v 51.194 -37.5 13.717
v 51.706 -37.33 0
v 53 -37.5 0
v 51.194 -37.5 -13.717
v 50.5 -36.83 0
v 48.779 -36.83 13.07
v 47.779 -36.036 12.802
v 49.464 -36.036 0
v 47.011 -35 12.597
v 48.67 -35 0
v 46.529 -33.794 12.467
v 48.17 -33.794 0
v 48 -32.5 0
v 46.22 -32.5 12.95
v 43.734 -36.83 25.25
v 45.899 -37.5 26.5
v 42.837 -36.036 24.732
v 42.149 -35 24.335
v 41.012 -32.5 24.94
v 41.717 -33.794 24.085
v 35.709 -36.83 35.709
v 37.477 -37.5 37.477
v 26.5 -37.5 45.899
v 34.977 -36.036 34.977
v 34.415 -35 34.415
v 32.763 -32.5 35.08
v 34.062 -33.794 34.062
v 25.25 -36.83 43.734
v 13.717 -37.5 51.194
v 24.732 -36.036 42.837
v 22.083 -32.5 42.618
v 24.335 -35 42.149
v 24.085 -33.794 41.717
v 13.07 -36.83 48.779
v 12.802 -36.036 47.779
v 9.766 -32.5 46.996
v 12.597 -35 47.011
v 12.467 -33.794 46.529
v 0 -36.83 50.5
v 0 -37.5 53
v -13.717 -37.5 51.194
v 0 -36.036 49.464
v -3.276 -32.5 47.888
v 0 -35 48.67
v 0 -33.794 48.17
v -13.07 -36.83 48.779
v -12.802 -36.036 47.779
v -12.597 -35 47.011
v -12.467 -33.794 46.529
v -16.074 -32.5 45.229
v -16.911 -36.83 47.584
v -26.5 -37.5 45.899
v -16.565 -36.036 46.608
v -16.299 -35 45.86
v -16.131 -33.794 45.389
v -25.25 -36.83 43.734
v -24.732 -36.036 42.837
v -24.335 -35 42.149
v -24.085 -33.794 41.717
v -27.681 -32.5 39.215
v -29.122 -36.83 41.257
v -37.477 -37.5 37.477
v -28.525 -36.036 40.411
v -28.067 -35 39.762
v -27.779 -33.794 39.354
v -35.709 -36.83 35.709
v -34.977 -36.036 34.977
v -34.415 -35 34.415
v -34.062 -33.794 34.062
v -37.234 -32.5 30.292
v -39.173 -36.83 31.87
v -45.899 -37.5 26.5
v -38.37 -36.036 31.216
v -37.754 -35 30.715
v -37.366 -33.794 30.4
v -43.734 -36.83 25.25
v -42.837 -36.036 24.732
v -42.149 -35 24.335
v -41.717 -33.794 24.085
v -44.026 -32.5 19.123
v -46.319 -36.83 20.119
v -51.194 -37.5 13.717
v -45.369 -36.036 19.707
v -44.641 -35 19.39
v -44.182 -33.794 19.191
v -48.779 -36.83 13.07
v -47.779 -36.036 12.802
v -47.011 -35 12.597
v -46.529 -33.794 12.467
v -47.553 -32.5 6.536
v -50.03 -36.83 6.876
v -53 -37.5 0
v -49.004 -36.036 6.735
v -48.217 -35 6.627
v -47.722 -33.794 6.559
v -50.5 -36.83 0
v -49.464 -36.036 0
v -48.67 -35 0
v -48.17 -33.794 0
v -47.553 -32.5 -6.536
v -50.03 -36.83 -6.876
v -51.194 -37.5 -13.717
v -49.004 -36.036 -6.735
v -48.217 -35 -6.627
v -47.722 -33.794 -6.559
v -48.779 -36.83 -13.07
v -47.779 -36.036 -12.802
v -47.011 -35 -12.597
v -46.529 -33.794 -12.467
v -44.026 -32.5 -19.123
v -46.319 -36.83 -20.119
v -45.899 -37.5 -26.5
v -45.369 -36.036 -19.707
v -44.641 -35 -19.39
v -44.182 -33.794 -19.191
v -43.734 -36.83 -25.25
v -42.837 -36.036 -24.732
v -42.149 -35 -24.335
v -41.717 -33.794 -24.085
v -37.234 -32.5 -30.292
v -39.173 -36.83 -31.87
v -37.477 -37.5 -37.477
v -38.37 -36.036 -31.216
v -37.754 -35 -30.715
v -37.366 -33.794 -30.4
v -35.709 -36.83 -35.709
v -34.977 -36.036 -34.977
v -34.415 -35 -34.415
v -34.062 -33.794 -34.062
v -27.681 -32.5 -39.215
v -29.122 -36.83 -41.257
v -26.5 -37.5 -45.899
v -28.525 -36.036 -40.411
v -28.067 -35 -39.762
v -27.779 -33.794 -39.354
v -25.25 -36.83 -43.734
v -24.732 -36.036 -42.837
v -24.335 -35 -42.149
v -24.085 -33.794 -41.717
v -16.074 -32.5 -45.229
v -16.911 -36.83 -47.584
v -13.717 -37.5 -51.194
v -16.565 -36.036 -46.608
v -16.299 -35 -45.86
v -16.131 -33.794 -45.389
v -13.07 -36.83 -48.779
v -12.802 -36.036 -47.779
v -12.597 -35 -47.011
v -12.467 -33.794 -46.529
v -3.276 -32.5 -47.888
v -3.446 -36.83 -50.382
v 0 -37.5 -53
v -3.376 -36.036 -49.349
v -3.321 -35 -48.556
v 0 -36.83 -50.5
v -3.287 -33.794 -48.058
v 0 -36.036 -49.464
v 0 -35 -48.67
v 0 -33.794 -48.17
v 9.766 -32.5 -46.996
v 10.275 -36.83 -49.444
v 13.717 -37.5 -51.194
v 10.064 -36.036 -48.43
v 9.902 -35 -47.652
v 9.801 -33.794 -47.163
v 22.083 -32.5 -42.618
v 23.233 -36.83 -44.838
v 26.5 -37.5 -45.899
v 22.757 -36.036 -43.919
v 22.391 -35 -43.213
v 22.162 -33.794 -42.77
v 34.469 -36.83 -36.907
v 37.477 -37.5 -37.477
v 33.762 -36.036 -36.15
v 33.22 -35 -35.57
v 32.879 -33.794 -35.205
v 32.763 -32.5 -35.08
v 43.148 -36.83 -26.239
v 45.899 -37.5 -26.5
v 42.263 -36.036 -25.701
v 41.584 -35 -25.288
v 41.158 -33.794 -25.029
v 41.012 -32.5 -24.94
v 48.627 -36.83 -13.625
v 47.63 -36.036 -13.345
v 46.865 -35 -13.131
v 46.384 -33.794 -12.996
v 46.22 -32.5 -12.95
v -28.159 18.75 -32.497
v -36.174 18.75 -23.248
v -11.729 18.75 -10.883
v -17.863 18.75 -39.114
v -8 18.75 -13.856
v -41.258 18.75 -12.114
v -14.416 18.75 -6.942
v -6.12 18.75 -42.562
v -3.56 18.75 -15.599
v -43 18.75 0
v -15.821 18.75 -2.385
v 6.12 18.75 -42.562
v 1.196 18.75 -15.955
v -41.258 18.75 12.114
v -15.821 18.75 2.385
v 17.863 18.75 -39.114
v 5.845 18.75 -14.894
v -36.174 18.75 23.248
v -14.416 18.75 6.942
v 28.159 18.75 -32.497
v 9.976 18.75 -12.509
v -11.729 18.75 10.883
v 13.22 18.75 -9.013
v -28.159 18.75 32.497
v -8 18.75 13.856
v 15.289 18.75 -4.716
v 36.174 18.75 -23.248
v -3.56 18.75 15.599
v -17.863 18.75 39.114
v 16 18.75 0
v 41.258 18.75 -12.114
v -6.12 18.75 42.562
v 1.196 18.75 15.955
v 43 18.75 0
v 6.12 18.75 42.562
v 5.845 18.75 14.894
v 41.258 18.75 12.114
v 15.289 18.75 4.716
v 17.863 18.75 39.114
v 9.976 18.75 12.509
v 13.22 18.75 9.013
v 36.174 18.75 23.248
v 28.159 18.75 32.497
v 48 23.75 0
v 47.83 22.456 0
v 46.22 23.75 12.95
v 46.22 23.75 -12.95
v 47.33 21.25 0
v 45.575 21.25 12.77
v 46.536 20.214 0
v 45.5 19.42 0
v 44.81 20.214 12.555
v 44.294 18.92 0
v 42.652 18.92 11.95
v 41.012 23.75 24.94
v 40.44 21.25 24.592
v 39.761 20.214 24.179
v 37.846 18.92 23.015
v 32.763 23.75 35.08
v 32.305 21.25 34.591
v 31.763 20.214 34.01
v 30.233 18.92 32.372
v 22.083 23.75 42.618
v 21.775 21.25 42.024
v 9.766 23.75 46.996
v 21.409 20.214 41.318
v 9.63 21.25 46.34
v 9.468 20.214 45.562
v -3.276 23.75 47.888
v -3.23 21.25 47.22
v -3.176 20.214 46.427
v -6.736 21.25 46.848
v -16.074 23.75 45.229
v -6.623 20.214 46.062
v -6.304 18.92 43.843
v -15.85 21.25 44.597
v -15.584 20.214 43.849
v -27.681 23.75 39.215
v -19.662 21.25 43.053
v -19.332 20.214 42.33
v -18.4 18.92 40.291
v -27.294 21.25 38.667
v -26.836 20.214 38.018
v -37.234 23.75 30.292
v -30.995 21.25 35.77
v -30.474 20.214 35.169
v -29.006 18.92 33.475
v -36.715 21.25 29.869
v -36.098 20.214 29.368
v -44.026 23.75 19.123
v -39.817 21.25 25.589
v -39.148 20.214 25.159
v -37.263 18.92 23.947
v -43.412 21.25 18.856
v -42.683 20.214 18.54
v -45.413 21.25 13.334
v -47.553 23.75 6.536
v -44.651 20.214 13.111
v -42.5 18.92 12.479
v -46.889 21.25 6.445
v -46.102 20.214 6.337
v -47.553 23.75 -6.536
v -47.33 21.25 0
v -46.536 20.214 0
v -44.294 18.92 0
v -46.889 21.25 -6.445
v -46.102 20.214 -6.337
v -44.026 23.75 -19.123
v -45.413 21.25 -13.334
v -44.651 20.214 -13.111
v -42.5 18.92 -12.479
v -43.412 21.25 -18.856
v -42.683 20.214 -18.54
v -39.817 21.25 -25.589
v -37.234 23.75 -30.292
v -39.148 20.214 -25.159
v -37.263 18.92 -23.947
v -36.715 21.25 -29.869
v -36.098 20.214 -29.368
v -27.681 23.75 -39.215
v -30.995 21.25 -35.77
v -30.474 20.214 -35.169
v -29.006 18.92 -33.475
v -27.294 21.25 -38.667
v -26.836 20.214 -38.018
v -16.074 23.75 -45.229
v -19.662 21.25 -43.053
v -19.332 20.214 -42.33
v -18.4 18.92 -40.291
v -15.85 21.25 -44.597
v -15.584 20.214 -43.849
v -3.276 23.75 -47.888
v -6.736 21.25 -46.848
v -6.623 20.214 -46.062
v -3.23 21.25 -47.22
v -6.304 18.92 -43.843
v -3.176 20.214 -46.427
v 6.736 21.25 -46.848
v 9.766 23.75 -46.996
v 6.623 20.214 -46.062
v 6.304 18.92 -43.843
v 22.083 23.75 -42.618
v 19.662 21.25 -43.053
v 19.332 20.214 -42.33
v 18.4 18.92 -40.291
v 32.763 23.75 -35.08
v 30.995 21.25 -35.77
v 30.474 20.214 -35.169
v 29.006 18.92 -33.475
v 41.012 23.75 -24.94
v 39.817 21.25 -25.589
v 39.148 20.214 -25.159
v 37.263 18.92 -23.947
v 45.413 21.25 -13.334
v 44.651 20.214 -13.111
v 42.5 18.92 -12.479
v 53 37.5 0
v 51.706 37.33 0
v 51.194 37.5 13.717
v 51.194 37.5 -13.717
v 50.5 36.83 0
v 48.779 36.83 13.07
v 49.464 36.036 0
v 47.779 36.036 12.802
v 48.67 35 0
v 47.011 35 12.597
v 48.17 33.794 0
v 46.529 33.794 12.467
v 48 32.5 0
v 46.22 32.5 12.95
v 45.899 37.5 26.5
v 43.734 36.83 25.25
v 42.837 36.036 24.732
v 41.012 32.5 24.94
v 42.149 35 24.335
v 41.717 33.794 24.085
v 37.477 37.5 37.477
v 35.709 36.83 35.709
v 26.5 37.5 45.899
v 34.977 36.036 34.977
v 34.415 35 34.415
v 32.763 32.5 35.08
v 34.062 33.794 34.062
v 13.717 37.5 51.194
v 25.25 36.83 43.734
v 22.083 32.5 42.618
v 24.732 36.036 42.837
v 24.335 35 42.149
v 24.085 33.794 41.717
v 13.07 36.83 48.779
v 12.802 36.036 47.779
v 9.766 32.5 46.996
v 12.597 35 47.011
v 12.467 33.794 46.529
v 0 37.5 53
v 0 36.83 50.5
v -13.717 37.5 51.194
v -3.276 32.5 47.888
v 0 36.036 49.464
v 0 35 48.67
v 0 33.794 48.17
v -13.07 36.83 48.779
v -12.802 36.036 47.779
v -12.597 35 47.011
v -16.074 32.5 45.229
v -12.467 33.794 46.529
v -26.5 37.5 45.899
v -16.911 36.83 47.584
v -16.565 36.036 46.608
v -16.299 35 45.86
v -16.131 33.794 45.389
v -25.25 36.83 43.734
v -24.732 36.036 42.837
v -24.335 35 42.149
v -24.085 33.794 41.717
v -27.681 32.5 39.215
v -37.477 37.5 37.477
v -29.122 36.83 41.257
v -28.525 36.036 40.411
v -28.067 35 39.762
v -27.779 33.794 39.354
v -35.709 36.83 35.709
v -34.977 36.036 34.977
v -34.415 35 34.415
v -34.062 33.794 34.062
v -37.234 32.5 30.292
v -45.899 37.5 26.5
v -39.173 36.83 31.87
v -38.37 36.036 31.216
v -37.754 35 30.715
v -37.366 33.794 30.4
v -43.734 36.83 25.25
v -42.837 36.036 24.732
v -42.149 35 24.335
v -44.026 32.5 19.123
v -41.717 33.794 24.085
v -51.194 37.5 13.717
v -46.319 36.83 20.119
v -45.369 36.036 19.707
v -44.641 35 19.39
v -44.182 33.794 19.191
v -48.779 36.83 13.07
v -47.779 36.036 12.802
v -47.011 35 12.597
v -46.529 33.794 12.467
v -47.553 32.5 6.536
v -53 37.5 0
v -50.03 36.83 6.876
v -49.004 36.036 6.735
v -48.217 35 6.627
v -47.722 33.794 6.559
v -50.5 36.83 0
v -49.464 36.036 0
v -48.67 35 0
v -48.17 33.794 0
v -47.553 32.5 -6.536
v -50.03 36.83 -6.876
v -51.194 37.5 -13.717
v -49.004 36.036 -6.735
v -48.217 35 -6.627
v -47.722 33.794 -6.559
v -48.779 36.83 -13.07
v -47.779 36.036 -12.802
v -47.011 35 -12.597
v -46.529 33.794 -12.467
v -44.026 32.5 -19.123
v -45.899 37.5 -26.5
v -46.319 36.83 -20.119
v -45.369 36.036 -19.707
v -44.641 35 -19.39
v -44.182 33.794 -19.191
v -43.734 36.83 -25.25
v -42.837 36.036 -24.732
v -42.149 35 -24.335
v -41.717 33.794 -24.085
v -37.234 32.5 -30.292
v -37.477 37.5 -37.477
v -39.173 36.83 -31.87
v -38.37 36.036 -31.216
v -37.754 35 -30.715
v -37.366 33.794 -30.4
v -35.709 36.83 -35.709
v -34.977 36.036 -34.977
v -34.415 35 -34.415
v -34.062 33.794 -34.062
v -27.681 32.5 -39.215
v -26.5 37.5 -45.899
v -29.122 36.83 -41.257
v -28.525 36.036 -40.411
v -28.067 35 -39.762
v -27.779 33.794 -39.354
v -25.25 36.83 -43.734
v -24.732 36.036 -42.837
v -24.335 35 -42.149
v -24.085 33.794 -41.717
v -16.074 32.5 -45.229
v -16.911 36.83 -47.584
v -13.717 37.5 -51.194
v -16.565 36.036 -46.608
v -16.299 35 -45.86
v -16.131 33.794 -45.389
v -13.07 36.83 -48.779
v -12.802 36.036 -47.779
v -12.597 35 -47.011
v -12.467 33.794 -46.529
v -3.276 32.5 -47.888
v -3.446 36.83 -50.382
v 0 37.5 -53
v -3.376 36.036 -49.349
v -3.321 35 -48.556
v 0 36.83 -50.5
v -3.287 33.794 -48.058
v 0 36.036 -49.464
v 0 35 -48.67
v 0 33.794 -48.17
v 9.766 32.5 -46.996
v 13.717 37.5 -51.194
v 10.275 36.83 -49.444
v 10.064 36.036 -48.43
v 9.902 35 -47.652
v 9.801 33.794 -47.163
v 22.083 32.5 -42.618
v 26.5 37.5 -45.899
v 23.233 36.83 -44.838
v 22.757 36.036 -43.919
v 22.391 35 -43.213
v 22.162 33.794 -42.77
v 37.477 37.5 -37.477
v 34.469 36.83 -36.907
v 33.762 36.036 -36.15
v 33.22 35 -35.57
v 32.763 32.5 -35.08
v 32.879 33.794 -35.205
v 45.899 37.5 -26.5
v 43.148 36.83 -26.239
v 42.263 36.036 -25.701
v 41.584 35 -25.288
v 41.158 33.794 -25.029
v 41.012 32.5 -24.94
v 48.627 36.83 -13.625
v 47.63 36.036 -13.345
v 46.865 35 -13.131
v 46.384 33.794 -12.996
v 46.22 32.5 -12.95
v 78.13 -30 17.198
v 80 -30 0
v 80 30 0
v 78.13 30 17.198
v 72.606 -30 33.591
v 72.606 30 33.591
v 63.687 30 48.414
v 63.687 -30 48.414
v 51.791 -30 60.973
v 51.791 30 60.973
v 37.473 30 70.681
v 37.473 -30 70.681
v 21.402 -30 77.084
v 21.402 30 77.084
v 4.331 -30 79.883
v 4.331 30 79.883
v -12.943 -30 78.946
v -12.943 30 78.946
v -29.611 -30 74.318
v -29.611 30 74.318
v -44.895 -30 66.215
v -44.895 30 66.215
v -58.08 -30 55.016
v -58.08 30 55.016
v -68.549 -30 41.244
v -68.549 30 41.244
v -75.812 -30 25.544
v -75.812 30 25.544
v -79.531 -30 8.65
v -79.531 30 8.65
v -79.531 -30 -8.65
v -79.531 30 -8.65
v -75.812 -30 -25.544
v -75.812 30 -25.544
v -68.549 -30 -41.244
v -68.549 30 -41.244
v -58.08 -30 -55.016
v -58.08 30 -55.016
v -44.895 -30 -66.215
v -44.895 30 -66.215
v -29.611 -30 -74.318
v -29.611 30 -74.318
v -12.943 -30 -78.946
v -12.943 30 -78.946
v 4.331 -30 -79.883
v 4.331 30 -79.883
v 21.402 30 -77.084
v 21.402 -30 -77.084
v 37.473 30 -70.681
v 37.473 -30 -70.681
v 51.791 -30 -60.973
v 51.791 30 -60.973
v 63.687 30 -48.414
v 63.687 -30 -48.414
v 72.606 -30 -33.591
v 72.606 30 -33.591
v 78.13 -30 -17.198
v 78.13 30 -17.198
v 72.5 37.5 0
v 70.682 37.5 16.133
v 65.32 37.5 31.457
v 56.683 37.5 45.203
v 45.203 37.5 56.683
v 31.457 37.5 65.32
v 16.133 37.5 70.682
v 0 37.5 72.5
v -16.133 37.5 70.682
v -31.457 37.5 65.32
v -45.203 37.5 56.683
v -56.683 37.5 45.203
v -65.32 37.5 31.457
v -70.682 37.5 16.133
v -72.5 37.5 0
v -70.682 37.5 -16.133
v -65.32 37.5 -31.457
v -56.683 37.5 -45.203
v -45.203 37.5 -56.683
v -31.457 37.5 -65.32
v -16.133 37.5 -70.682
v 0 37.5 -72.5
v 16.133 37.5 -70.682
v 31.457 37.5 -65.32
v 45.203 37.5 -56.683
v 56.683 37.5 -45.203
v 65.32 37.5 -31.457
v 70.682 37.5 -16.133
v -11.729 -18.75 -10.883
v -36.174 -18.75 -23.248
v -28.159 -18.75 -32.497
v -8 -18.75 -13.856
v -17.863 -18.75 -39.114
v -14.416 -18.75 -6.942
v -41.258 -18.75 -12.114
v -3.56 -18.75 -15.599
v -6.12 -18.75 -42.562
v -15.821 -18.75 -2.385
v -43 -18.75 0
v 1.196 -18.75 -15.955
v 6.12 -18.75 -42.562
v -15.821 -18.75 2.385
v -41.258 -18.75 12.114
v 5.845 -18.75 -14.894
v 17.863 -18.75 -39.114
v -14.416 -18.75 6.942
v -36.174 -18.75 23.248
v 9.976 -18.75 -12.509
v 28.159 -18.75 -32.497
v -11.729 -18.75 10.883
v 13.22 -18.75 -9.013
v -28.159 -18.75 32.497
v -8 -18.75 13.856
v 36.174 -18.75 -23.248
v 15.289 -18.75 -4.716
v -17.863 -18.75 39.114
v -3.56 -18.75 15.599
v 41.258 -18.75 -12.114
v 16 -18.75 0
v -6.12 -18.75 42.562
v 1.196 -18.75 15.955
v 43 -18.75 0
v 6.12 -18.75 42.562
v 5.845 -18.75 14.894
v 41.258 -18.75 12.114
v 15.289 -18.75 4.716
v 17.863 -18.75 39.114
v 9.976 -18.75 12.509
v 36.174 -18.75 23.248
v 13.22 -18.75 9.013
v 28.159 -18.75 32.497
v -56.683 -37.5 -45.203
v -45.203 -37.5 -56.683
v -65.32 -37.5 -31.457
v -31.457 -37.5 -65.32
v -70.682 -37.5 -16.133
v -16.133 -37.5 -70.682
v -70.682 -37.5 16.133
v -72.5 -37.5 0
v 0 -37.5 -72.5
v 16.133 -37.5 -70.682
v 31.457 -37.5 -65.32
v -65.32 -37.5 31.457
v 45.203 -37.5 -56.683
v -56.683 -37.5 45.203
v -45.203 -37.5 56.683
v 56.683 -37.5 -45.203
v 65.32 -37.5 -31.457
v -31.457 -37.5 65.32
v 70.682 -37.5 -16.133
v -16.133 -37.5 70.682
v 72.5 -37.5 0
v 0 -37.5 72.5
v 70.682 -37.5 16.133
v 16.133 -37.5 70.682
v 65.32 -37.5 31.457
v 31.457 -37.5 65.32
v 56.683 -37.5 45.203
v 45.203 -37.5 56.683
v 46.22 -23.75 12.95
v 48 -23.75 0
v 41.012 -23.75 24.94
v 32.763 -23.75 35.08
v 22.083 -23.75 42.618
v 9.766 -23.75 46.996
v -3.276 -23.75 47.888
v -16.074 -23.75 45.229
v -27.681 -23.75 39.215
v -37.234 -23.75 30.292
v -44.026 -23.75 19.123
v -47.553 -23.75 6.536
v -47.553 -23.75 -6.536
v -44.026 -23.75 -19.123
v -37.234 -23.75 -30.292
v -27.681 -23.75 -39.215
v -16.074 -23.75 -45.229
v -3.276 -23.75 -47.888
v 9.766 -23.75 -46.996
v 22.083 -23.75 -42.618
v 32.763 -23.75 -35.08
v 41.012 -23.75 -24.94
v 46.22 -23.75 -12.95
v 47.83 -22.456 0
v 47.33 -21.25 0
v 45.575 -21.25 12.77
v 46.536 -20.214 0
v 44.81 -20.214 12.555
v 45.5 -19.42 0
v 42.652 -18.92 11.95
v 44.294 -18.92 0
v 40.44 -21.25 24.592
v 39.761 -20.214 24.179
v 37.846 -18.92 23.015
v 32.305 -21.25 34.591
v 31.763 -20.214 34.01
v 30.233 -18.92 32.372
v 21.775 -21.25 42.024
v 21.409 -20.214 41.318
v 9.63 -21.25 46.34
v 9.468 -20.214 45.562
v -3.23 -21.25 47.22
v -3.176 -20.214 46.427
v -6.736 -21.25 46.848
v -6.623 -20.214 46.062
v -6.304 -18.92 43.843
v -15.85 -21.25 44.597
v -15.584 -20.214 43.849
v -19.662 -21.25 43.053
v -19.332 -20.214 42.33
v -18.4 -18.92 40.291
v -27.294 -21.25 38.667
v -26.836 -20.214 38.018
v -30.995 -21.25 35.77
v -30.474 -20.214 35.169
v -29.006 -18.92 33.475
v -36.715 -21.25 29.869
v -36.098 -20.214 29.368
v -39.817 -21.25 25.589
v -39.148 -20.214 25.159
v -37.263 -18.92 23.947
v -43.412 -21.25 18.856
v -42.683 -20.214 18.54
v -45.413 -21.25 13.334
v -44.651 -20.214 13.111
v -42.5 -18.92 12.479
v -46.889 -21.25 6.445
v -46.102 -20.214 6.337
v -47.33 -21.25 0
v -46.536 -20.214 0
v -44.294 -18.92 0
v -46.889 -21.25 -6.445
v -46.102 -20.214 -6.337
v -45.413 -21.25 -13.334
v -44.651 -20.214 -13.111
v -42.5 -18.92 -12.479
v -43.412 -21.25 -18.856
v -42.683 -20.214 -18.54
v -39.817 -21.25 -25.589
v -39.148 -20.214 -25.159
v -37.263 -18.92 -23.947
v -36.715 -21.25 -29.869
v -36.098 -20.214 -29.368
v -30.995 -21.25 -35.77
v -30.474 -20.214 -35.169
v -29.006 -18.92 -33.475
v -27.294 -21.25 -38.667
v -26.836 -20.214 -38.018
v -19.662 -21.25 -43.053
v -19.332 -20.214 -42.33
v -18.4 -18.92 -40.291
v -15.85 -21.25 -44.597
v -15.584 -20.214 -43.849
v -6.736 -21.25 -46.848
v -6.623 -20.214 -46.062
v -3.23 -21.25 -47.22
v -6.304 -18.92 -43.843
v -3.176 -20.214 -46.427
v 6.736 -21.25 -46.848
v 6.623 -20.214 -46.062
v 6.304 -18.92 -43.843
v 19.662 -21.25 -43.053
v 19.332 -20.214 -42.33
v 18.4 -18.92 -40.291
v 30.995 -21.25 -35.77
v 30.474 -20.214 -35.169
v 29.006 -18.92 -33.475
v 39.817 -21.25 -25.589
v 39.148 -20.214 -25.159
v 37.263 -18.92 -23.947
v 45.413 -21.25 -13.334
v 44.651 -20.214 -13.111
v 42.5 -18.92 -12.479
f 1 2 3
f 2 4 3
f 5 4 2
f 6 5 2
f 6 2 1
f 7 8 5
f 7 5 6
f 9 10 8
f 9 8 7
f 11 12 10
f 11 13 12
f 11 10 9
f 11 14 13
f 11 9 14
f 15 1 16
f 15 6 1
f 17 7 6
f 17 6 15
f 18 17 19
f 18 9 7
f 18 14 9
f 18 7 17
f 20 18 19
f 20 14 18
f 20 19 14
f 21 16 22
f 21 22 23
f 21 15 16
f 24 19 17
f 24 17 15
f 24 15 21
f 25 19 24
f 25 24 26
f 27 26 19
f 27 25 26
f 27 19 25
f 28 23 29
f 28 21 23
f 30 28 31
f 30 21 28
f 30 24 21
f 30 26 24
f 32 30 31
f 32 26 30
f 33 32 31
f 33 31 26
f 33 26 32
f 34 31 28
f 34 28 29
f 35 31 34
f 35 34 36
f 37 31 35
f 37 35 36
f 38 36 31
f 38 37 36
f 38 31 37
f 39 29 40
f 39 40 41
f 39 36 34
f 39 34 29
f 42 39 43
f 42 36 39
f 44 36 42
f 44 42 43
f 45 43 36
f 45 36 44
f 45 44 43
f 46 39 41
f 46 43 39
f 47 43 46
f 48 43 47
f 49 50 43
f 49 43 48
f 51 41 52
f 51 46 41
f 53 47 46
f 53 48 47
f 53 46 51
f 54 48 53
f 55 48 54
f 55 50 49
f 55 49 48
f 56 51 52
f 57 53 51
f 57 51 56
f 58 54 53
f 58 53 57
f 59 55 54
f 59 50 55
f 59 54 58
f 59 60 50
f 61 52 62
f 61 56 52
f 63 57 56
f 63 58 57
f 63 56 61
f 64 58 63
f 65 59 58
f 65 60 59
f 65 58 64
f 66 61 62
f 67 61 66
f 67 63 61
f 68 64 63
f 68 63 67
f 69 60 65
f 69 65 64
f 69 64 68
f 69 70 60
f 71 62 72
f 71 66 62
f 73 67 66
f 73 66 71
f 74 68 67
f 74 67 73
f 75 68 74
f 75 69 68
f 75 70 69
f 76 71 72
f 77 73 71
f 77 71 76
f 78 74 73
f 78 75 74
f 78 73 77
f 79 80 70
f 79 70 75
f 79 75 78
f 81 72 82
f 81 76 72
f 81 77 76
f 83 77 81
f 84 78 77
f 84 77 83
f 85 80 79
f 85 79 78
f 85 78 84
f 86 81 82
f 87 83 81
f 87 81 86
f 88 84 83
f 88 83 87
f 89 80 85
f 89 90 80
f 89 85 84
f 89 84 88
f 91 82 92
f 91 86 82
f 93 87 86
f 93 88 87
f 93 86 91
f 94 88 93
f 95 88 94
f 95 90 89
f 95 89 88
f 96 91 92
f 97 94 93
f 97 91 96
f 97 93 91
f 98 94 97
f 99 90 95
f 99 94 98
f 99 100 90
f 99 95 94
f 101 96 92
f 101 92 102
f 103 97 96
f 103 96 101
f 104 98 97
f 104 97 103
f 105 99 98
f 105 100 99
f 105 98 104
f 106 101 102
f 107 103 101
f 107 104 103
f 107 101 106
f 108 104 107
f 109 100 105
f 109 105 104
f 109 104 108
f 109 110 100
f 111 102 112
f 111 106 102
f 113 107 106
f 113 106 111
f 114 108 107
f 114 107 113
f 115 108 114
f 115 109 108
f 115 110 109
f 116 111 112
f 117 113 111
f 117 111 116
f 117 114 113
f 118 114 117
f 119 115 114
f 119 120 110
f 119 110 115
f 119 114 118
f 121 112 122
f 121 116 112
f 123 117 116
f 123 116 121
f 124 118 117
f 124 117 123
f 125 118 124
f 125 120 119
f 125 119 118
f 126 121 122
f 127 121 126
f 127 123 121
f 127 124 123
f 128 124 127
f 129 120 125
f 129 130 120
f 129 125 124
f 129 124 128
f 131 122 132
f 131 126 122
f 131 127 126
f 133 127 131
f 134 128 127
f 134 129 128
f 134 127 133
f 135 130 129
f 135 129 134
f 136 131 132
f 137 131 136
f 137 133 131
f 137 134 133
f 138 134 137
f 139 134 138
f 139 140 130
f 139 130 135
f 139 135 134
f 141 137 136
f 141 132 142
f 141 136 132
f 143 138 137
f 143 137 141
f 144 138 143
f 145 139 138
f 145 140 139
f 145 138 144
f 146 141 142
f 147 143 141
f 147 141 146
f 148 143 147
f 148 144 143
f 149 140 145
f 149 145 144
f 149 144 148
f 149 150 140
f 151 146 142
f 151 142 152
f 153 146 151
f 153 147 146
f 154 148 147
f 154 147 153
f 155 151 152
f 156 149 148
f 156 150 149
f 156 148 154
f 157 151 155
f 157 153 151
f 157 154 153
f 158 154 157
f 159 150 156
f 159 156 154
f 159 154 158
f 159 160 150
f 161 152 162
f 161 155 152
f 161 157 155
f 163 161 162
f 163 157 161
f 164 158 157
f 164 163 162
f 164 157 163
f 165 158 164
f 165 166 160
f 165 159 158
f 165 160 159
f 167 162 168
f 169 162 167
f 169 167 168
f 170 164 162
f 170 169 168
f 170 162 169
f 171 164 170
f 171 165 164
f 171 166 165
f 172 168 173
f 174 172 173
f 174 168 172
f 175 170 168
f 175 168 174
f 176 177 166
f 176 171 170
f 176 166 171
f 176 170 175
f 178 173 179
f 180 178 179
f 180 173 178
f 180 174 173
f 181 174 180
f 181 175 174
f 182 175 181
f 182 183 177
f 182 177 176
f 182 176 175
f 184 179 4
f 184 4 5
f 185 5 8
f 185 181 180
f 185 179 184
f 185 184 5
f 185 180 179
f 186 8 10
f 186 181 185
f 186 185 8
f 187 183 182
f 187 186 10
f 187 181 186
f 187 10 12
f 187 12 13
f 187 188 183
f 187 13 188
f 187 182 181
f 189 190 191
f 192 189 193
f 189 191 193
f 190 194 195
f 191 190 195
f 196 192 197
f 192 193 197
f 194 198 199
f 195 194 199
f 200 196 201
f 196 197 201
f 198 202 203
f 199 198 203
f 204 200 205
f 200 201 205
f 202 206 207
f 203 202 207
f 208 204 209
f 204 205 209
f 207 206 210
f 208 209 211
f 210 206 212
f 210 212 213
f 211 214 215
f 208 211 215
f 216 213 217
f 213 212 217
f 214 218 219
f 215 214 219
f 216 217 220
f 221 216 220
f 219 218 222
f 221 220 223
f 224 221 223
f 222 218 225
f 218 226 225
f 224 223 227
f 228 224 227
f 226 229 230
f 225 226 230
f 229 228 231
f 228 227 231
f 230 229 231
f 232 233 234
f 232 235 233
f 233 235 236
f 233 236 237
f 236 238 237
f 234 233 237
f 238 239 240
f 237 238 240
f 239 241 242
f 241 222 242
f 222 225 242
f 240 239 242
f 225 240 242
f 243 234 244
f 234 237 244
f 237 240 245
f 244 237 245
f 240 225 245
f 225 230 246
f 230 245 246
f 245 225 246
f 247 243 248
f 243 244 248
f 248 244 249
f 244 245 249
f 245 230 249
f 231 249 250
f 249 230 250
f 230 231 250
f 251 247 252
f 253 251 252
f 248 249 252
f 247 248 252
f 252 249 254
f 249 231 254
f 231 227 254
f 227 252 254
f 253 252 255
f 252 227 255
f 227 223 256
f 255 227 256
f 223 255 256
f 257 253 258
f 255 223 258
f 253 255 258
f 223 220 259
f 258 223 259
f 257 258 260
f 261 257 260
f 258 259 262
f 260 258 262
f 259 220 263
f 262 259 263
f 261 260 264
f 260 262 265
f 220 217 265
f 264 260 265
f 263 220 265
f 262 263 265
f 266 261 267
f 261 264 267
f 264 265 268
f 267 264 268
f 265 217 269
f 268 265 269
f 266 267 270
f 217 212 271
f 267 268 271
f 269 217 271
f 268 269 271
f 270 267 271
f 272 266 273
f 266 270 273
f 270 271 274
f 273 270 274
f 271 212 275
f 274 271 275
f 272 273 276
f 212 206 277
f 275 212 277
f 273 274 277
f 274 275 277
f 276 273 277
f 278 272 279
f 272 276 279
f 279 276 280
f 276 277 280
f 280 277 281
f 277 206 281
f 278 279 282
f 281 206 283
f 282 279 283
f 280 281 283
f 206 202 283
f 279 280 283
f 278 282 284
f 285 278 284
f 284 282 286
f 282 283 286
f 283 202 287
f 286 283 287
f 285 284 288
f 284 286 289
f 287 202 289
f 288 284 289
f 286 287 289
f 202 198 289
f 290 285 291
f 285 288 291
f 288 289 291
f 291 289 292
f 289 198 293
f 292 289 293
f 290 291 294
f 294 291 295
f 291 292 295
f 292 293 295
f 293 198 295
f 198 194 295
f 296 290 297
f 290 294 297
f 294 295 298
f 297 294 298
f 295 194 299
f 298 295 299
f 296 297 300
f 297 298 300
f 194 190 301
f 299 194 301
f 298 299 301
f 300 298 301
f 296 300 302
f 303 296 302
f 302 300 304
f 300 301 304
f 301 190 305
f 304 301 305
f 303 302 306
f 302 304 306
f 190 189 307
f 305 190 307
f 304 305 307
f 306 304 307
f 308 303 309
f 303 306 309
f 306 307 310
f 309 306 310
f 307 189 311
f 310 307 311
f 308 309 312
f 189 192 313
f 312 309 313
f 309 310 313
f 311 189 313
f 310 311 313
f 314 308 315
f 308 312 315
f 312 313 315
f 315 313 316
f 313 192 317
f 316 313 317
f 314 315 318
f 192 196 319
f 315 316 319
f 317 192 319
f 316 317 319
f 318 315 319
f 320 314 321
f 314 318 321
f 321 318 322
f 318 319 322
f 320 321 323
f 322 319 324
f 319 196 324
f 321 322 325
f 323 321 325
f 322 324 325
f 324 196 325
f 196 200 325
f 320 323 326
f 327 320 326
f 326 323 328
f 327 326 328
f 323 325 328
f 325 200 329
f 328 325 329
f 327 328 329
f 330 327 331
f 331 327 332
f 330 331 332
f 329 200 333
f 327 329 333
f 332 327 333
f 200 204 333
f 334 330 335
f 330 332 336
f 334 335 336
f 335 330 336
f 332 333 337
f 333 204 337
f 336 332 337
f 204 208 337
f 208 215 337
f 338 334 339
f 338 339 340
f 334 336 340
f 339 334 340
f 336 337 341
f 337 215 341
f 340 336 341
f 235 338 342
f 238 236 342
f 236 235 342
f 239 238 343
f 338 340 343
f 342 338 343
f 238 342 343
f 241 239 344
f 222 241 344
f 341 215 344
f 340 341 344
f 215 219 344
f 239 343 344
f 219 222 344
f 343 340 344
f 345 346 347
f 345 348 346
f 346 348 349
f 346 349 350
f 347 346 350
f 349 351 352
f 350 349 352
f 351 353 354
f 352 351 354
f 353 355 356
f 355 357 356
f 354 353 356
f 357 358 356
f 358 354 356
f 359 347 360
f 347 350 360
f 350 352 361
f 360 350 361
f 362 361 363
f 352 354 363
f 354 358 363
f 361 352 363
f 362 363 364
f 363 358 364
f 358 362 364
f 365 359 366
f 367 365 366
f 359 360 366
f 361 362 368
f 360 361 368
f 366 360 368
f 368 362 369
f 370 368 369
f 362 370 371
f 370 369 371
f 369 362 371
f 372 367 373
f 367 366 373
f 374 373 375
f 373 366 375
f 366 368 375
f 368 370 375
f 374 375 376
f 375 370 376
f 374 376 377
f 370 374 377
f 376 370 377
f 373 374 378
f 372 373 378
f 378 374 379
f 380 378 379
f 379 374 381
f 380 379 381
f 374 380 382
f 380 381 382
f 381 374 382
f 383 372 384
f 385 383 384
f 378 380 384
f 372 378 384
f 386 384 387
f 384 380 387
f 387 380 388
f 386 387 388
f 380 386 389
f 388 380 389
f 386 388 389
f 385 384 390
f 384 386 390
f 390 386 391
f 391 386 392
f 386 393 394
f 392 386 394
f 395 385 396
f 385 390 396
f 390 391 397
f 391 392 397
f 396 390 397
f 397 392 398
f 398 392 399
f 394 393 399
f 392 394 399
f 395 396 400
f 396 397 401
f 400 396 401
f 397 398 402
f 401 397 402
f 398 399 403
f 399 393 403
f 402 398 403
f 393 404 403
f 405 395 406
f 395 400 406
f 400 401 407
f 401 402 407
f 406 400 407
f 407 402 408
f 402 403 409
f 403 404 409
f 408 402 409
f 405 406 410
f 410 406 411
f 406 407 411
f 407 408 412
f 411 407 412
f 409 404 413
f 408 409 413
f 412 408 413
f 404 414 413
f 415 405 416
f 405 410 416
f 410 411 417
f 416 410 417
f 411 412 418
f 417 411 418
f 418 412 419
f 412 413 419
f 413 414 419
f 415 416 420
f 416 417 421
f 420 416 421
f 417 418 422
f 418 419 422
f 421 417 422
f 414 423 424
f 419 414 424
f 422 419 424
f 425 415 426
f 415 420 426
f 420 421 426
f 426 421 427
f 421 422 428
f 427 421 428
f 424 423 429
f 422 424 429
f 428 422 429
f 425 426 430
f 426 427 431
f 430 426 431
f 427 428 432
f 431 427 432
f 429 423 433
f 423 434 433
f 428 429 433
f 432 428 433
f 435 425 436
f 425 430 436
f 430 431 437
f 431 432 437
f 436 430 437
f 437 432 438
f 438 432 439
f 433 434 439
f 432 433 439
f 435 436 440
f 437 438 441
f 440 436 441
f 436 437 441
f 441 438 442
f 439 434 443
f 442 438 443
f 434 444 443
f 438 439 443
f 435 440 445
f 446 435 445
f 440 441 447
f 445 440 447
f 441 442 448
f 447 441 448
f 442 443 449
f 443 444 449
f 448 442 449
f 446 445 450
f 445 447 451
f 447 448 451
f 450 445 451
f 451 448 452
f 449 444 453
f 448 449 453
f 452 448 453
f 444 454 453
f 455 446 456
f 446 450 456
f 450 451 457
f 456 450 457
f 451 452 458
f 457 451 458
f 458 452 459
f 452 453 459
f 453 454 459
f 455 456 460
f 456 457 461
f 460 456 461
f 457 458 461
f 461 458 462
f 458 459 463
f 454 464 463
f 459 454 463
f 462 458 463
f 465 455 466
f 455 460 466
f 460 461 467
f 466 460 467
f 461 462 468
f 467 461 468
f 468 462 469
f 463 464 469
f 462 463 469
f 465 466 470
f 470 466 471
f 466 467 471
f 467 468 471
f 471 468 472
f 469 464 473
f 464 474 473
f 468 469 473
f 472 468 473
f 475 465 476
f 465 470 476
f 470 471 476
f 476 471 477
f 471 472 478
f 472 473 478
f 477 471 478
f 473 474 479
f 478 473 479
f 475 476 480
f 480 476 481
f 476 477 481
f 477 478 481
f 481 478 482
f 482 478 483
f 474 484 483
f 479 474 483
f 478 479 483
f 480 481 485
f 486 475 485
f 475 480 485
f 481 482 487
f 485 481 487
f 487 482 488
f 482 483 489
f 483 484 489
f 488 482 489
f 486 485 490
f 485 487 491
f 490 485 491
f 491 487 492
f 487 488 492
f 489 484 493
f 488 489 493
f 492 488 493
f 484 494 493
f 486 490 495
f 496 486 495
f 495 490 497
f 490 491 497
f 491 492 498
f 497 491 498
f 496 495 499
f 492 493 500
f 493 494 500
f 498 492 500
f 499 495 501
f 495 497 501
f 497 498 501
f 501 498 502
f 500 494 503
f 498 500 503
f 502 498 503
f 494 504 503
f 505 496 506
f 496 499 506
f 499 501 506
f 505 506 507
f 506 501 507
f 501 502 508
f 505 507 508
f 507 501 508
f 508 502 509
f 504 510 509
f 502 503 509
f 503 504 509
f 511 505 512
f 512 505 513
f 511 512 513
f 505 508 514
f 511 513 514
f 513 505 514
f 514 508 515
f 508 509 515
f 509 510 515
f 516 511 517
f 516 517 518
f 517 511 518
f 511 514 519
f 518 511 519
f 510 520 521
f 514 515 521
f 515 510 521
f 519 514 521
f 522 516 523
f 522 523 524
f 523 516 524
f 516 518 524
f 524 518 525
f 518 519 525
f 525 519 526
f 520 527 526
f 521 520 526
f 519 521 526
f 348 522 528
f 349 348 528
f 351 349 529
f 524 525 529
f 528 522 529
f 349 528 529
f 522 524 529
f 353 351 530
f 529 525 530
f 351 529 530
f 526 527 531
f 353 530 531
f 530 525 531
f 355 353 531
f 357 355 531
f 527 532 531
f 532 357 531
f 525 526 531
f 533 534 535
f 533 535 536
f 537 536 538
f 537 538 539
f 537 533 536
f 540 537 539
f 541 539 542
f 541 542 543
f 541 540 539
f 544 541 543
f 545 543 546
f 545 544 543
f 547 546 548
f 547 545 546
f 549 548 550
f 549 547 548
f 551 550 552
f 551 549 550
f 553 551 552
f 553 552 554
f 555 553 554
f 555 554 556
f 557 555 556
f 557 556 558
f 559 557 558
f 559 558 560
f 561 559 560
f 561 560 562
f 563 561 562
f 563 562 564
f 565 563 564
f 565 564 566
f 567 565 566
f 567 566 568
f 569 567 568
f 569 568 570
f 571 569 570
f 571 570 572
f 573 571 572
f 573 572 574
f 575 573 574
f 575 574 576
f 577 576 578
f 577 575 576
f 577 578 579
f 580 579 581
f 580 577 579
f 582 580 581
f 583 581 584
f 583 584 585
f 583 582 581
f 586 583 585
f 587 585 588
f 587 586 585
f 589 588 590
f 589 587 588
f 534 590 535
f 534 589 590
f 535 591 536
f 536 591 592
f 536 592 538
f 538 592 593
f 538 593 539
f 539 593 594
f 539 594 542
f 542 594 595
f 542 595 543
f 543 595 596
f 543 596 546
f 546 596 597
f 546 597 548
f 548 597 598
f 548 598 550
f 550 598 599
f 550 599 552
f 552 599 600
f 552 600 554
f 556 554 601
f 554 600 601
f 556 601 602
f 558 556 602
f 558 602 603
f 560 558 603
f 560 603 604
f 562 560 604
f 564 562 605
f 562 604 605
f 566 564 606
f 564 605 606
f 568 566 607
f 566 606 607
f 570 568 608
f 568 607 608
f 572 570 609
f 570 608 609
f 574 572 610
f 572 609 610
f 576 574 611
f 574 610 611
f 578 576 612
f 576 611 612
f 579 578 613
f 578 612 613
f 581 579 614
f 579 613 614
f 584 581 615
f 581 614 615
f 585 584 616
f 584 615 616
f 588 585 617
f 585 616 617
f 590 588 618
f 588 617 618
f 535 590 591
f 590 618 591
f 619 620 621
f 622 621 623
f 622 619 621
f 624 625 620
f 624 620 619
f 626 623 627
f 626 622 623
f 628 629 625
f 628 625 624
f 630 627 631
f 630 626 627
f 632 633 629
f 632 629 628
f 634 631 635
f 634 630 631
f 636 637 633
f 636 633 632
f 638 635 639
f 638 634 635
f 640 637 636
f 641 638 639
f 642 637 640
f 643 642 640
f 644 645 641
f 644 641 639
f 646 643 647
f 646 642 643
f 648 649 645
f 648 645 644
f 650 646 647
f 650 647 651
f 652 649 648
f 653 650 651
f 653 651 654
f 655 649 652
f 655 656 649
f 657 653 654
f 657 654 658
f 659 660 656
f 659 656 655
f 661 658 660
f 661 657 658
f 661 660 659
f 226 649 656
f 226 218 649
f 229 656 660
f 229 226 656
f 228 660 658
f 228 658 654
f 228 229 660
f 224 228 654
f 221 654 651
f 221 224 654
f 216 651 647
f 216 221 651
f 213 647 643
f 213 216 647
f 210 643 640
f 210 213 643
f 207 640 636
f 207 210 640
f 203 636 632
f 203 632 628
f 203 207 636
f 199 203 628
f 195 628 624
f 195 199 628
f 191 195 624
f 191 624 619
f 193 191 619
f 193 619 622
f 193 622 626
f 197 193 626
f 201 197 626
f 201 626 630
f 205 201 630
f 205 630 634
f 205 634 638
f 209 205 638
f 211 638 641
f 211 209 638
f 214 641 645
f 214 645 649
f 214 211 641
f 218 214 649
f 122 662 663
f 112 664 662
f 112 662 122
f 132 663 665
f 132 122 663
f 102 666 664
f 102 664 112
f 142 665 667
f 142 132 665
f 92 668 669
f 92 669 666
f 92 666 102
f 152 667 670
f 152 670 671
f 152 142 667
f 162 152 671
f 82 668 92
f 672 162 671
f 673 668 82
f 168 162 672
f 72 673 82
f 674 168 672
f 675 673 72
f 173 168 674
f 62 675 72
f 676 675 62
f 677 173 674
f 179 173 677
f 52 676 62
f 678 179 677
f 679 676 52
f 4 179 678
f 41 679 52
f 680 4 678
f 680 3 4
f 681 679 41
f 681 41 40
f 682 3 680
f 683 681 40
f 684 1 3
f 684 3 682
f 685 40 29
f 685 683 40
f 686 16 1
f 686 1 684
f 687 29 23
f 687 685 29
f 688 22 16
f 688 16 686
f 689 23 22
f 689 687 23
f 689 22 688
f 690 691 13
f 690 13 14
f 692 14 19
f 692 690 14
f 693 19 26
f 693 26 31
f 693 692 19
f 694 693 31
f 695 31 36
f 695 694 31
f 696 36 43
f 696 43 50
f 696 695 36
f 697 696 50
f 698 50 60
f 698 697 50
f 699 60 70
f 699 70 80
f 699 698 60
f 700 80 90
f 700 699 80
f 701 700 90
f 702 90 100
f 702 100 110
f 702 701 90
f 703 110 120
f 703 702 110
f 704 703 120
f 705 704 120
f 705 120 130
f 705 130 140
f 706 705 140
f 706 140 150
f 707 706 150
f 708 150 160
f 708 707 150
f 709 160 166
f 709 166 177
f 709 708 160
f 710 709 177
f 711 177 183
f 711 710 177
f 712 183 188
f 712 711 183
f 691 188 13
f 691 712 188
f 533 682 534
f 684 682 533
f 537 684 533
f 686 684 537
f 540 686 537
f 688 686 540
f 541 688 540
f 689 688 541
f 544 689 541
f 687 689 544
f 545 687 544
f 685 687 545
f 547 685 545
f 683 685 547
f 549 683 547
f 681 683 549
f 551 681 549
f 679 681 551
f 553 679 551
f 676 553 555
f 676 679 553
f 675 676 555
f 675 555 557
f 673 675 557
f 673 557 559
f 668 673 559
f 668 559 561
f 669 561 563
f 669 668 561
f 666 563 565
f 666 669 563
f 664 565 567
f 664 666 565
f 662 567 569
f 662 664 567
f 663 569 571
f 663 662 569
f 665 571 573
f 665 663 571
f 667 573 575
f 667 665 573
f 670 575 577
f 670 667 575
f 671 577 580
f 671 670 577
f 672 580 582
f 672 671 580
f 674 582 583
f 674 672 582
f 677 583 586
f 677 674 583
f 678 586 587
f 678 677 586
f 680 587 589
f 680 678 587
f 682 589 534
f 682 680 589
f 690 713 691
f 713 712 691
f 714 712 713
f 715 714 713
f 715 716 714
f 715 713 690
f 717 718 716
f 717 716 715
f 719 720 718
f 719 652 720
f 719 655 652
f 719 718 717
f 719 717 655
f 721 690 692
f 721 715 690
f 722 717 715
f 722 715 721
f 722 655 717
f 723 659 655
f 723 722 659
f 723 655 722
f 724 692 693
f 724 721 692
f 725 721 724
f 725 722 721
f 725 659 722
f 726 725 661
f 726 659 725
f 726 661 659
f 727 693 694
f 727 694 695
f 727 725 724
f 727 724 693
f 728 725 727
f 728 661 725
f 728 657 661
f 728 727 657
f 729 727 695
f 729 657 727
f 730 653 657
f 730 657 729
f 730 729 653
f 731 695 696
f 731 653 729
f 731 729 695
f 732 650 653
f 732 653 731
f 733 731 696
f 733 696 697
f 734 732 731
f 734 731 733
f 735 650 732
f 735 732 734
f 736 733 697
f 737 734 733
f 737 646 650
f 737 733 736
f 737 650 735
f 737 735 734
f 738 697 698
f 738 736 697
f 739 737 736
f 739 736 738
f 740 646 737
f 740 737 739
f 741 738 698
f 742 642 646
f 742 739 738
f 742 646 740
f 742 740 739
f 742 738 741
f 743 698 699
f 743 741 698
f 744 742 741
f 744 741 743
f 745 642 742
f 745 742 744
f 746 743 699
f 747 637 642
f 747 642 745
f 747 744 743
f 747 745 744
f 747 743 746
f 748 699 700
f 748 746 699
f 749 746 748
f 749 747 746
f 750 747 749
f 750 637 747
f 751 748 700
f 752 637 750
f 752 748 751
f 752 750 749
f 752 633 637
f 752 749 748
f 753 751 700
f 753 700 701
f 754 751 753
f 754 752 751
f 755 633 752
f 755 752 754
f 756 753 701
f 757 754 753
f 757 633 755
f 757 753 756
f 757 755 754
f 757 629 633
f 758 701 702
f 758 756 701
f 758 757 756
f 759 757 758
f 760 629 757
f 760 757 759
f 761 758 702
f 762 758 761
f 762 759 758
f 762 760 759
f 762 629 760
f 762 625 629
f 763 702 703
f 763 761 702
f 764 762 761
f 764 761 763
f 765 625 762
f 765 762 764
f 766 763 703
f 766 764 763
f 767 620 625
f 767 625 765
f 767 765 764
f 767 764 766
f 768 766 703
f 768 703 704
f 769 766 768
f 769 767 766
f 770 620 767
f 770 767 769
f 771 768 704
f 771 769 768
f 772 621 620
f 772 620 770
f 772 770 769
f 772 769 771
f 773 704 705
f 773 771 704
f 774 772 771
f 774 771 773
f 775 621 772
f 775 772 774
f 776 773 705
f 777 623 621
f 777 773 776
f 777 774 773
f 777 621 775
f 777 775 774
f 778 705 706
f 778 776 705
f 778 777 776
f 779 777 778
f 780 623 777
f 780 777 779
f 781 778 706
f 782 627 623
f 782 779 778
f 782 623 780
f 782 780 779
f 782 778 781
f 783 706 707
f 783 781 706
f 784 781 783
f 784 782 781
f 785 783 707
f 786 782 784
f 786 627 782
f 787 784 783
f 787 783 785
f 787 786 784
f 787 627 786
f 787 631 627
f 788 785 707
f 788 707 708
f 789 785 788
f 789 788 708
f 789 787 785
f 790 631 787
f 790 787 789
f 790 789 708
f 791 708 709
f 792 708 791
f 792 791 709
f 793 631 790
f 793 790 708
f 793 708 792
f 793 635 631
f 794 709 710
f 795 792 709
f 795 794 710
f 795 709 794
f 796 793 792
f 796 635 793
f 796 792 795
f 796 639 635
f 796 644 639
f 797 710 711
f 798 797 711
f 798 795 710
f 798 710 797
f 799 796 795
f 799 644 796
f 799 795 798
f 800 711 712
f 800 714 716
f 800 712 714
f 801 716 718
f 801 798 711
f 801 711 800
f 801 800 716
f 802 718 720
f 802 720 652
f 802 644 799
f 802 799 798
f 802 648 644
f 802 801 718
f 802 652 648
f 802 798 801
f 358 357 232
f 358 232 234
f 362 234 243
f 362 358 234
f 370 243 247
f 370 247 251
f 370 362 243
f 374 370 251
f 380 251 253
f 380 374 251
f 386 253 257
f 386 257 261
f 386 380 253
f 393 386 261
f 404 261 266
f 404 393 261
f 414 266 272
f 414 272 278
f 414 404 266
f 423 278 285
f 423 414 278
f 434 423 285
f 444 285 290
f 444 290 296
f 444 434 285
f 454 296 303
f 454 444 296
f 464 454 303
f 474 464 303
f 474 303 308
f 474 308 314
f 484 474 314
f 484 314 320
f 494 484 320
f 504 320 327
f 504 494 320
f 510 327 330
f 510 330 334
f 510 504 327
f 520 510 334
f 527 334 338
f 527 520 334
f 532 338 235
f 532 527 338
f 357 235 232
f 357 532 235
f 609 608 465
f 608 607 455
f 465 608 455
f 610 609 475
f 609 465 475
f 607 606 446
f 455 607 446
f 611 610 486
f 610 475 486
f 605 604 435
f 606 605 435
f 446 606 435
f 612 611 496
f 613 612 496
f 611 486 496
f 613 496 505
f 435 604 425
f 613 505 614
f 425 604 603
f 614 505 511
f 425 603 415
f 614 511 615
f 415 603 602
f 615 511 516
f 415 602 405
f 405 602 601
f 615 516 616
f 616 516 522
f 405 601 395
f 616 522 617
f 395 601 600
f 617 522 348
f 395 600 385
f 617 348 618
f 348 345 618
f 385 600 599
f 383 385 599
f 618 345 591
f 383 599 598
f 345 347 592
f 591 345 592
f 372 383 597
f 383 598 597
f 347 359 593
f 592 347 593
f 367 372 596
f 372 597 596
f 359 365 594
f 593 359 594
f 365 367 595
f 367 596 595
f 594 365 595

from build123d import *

# Parameters (mm, degrees)
F0_R     = 48
F0_R_2   = 16
F1_DEPTH = 18.75
F0_R_3   = 80
F2_DEPTH = 37.5
F3_SIZE  = 7.5
F4_R     = 5


with BuildPart() as f1:
    # F0 (on Front) → F1 (new body, symmetric)
    with BuildSketch(Plane.XZ):
        Circle(F0_R)
        Circle(F0_R_2, mode=Mode.SUBTRACT)
    extrude(amount=F1_DEPTH, both=True)

    # F0 (on Front) → F2 (join, symmetric)
    with BuildSketch(Plane.XZ):
        Circle(F0_R_3)
        Circle(F0_R, mode=Mode.SUBTRACT)
    extrude(amount=F2_DEPTH, both=True)

    # F3
    f3_edges = [f1.edges().sort_by_distance(p)[0] for p in [
        (-80, 37.5, 0),
        (-80, -37.5, 0),
    ]]
    chamfer(f3_edges, length=F3_SIZE)

    # F4
    f4_edges = [f1.edges().sort_by_distance(p)[0] for p in [
        (-48, -37.5, 0),
        (-48, 37.5, 0),
        (-48, 18.75, 0),
        (-48, -18.75, 0),
    ]]
    fillet(f4_edges, radius=F4_R)


solid = f1.part
